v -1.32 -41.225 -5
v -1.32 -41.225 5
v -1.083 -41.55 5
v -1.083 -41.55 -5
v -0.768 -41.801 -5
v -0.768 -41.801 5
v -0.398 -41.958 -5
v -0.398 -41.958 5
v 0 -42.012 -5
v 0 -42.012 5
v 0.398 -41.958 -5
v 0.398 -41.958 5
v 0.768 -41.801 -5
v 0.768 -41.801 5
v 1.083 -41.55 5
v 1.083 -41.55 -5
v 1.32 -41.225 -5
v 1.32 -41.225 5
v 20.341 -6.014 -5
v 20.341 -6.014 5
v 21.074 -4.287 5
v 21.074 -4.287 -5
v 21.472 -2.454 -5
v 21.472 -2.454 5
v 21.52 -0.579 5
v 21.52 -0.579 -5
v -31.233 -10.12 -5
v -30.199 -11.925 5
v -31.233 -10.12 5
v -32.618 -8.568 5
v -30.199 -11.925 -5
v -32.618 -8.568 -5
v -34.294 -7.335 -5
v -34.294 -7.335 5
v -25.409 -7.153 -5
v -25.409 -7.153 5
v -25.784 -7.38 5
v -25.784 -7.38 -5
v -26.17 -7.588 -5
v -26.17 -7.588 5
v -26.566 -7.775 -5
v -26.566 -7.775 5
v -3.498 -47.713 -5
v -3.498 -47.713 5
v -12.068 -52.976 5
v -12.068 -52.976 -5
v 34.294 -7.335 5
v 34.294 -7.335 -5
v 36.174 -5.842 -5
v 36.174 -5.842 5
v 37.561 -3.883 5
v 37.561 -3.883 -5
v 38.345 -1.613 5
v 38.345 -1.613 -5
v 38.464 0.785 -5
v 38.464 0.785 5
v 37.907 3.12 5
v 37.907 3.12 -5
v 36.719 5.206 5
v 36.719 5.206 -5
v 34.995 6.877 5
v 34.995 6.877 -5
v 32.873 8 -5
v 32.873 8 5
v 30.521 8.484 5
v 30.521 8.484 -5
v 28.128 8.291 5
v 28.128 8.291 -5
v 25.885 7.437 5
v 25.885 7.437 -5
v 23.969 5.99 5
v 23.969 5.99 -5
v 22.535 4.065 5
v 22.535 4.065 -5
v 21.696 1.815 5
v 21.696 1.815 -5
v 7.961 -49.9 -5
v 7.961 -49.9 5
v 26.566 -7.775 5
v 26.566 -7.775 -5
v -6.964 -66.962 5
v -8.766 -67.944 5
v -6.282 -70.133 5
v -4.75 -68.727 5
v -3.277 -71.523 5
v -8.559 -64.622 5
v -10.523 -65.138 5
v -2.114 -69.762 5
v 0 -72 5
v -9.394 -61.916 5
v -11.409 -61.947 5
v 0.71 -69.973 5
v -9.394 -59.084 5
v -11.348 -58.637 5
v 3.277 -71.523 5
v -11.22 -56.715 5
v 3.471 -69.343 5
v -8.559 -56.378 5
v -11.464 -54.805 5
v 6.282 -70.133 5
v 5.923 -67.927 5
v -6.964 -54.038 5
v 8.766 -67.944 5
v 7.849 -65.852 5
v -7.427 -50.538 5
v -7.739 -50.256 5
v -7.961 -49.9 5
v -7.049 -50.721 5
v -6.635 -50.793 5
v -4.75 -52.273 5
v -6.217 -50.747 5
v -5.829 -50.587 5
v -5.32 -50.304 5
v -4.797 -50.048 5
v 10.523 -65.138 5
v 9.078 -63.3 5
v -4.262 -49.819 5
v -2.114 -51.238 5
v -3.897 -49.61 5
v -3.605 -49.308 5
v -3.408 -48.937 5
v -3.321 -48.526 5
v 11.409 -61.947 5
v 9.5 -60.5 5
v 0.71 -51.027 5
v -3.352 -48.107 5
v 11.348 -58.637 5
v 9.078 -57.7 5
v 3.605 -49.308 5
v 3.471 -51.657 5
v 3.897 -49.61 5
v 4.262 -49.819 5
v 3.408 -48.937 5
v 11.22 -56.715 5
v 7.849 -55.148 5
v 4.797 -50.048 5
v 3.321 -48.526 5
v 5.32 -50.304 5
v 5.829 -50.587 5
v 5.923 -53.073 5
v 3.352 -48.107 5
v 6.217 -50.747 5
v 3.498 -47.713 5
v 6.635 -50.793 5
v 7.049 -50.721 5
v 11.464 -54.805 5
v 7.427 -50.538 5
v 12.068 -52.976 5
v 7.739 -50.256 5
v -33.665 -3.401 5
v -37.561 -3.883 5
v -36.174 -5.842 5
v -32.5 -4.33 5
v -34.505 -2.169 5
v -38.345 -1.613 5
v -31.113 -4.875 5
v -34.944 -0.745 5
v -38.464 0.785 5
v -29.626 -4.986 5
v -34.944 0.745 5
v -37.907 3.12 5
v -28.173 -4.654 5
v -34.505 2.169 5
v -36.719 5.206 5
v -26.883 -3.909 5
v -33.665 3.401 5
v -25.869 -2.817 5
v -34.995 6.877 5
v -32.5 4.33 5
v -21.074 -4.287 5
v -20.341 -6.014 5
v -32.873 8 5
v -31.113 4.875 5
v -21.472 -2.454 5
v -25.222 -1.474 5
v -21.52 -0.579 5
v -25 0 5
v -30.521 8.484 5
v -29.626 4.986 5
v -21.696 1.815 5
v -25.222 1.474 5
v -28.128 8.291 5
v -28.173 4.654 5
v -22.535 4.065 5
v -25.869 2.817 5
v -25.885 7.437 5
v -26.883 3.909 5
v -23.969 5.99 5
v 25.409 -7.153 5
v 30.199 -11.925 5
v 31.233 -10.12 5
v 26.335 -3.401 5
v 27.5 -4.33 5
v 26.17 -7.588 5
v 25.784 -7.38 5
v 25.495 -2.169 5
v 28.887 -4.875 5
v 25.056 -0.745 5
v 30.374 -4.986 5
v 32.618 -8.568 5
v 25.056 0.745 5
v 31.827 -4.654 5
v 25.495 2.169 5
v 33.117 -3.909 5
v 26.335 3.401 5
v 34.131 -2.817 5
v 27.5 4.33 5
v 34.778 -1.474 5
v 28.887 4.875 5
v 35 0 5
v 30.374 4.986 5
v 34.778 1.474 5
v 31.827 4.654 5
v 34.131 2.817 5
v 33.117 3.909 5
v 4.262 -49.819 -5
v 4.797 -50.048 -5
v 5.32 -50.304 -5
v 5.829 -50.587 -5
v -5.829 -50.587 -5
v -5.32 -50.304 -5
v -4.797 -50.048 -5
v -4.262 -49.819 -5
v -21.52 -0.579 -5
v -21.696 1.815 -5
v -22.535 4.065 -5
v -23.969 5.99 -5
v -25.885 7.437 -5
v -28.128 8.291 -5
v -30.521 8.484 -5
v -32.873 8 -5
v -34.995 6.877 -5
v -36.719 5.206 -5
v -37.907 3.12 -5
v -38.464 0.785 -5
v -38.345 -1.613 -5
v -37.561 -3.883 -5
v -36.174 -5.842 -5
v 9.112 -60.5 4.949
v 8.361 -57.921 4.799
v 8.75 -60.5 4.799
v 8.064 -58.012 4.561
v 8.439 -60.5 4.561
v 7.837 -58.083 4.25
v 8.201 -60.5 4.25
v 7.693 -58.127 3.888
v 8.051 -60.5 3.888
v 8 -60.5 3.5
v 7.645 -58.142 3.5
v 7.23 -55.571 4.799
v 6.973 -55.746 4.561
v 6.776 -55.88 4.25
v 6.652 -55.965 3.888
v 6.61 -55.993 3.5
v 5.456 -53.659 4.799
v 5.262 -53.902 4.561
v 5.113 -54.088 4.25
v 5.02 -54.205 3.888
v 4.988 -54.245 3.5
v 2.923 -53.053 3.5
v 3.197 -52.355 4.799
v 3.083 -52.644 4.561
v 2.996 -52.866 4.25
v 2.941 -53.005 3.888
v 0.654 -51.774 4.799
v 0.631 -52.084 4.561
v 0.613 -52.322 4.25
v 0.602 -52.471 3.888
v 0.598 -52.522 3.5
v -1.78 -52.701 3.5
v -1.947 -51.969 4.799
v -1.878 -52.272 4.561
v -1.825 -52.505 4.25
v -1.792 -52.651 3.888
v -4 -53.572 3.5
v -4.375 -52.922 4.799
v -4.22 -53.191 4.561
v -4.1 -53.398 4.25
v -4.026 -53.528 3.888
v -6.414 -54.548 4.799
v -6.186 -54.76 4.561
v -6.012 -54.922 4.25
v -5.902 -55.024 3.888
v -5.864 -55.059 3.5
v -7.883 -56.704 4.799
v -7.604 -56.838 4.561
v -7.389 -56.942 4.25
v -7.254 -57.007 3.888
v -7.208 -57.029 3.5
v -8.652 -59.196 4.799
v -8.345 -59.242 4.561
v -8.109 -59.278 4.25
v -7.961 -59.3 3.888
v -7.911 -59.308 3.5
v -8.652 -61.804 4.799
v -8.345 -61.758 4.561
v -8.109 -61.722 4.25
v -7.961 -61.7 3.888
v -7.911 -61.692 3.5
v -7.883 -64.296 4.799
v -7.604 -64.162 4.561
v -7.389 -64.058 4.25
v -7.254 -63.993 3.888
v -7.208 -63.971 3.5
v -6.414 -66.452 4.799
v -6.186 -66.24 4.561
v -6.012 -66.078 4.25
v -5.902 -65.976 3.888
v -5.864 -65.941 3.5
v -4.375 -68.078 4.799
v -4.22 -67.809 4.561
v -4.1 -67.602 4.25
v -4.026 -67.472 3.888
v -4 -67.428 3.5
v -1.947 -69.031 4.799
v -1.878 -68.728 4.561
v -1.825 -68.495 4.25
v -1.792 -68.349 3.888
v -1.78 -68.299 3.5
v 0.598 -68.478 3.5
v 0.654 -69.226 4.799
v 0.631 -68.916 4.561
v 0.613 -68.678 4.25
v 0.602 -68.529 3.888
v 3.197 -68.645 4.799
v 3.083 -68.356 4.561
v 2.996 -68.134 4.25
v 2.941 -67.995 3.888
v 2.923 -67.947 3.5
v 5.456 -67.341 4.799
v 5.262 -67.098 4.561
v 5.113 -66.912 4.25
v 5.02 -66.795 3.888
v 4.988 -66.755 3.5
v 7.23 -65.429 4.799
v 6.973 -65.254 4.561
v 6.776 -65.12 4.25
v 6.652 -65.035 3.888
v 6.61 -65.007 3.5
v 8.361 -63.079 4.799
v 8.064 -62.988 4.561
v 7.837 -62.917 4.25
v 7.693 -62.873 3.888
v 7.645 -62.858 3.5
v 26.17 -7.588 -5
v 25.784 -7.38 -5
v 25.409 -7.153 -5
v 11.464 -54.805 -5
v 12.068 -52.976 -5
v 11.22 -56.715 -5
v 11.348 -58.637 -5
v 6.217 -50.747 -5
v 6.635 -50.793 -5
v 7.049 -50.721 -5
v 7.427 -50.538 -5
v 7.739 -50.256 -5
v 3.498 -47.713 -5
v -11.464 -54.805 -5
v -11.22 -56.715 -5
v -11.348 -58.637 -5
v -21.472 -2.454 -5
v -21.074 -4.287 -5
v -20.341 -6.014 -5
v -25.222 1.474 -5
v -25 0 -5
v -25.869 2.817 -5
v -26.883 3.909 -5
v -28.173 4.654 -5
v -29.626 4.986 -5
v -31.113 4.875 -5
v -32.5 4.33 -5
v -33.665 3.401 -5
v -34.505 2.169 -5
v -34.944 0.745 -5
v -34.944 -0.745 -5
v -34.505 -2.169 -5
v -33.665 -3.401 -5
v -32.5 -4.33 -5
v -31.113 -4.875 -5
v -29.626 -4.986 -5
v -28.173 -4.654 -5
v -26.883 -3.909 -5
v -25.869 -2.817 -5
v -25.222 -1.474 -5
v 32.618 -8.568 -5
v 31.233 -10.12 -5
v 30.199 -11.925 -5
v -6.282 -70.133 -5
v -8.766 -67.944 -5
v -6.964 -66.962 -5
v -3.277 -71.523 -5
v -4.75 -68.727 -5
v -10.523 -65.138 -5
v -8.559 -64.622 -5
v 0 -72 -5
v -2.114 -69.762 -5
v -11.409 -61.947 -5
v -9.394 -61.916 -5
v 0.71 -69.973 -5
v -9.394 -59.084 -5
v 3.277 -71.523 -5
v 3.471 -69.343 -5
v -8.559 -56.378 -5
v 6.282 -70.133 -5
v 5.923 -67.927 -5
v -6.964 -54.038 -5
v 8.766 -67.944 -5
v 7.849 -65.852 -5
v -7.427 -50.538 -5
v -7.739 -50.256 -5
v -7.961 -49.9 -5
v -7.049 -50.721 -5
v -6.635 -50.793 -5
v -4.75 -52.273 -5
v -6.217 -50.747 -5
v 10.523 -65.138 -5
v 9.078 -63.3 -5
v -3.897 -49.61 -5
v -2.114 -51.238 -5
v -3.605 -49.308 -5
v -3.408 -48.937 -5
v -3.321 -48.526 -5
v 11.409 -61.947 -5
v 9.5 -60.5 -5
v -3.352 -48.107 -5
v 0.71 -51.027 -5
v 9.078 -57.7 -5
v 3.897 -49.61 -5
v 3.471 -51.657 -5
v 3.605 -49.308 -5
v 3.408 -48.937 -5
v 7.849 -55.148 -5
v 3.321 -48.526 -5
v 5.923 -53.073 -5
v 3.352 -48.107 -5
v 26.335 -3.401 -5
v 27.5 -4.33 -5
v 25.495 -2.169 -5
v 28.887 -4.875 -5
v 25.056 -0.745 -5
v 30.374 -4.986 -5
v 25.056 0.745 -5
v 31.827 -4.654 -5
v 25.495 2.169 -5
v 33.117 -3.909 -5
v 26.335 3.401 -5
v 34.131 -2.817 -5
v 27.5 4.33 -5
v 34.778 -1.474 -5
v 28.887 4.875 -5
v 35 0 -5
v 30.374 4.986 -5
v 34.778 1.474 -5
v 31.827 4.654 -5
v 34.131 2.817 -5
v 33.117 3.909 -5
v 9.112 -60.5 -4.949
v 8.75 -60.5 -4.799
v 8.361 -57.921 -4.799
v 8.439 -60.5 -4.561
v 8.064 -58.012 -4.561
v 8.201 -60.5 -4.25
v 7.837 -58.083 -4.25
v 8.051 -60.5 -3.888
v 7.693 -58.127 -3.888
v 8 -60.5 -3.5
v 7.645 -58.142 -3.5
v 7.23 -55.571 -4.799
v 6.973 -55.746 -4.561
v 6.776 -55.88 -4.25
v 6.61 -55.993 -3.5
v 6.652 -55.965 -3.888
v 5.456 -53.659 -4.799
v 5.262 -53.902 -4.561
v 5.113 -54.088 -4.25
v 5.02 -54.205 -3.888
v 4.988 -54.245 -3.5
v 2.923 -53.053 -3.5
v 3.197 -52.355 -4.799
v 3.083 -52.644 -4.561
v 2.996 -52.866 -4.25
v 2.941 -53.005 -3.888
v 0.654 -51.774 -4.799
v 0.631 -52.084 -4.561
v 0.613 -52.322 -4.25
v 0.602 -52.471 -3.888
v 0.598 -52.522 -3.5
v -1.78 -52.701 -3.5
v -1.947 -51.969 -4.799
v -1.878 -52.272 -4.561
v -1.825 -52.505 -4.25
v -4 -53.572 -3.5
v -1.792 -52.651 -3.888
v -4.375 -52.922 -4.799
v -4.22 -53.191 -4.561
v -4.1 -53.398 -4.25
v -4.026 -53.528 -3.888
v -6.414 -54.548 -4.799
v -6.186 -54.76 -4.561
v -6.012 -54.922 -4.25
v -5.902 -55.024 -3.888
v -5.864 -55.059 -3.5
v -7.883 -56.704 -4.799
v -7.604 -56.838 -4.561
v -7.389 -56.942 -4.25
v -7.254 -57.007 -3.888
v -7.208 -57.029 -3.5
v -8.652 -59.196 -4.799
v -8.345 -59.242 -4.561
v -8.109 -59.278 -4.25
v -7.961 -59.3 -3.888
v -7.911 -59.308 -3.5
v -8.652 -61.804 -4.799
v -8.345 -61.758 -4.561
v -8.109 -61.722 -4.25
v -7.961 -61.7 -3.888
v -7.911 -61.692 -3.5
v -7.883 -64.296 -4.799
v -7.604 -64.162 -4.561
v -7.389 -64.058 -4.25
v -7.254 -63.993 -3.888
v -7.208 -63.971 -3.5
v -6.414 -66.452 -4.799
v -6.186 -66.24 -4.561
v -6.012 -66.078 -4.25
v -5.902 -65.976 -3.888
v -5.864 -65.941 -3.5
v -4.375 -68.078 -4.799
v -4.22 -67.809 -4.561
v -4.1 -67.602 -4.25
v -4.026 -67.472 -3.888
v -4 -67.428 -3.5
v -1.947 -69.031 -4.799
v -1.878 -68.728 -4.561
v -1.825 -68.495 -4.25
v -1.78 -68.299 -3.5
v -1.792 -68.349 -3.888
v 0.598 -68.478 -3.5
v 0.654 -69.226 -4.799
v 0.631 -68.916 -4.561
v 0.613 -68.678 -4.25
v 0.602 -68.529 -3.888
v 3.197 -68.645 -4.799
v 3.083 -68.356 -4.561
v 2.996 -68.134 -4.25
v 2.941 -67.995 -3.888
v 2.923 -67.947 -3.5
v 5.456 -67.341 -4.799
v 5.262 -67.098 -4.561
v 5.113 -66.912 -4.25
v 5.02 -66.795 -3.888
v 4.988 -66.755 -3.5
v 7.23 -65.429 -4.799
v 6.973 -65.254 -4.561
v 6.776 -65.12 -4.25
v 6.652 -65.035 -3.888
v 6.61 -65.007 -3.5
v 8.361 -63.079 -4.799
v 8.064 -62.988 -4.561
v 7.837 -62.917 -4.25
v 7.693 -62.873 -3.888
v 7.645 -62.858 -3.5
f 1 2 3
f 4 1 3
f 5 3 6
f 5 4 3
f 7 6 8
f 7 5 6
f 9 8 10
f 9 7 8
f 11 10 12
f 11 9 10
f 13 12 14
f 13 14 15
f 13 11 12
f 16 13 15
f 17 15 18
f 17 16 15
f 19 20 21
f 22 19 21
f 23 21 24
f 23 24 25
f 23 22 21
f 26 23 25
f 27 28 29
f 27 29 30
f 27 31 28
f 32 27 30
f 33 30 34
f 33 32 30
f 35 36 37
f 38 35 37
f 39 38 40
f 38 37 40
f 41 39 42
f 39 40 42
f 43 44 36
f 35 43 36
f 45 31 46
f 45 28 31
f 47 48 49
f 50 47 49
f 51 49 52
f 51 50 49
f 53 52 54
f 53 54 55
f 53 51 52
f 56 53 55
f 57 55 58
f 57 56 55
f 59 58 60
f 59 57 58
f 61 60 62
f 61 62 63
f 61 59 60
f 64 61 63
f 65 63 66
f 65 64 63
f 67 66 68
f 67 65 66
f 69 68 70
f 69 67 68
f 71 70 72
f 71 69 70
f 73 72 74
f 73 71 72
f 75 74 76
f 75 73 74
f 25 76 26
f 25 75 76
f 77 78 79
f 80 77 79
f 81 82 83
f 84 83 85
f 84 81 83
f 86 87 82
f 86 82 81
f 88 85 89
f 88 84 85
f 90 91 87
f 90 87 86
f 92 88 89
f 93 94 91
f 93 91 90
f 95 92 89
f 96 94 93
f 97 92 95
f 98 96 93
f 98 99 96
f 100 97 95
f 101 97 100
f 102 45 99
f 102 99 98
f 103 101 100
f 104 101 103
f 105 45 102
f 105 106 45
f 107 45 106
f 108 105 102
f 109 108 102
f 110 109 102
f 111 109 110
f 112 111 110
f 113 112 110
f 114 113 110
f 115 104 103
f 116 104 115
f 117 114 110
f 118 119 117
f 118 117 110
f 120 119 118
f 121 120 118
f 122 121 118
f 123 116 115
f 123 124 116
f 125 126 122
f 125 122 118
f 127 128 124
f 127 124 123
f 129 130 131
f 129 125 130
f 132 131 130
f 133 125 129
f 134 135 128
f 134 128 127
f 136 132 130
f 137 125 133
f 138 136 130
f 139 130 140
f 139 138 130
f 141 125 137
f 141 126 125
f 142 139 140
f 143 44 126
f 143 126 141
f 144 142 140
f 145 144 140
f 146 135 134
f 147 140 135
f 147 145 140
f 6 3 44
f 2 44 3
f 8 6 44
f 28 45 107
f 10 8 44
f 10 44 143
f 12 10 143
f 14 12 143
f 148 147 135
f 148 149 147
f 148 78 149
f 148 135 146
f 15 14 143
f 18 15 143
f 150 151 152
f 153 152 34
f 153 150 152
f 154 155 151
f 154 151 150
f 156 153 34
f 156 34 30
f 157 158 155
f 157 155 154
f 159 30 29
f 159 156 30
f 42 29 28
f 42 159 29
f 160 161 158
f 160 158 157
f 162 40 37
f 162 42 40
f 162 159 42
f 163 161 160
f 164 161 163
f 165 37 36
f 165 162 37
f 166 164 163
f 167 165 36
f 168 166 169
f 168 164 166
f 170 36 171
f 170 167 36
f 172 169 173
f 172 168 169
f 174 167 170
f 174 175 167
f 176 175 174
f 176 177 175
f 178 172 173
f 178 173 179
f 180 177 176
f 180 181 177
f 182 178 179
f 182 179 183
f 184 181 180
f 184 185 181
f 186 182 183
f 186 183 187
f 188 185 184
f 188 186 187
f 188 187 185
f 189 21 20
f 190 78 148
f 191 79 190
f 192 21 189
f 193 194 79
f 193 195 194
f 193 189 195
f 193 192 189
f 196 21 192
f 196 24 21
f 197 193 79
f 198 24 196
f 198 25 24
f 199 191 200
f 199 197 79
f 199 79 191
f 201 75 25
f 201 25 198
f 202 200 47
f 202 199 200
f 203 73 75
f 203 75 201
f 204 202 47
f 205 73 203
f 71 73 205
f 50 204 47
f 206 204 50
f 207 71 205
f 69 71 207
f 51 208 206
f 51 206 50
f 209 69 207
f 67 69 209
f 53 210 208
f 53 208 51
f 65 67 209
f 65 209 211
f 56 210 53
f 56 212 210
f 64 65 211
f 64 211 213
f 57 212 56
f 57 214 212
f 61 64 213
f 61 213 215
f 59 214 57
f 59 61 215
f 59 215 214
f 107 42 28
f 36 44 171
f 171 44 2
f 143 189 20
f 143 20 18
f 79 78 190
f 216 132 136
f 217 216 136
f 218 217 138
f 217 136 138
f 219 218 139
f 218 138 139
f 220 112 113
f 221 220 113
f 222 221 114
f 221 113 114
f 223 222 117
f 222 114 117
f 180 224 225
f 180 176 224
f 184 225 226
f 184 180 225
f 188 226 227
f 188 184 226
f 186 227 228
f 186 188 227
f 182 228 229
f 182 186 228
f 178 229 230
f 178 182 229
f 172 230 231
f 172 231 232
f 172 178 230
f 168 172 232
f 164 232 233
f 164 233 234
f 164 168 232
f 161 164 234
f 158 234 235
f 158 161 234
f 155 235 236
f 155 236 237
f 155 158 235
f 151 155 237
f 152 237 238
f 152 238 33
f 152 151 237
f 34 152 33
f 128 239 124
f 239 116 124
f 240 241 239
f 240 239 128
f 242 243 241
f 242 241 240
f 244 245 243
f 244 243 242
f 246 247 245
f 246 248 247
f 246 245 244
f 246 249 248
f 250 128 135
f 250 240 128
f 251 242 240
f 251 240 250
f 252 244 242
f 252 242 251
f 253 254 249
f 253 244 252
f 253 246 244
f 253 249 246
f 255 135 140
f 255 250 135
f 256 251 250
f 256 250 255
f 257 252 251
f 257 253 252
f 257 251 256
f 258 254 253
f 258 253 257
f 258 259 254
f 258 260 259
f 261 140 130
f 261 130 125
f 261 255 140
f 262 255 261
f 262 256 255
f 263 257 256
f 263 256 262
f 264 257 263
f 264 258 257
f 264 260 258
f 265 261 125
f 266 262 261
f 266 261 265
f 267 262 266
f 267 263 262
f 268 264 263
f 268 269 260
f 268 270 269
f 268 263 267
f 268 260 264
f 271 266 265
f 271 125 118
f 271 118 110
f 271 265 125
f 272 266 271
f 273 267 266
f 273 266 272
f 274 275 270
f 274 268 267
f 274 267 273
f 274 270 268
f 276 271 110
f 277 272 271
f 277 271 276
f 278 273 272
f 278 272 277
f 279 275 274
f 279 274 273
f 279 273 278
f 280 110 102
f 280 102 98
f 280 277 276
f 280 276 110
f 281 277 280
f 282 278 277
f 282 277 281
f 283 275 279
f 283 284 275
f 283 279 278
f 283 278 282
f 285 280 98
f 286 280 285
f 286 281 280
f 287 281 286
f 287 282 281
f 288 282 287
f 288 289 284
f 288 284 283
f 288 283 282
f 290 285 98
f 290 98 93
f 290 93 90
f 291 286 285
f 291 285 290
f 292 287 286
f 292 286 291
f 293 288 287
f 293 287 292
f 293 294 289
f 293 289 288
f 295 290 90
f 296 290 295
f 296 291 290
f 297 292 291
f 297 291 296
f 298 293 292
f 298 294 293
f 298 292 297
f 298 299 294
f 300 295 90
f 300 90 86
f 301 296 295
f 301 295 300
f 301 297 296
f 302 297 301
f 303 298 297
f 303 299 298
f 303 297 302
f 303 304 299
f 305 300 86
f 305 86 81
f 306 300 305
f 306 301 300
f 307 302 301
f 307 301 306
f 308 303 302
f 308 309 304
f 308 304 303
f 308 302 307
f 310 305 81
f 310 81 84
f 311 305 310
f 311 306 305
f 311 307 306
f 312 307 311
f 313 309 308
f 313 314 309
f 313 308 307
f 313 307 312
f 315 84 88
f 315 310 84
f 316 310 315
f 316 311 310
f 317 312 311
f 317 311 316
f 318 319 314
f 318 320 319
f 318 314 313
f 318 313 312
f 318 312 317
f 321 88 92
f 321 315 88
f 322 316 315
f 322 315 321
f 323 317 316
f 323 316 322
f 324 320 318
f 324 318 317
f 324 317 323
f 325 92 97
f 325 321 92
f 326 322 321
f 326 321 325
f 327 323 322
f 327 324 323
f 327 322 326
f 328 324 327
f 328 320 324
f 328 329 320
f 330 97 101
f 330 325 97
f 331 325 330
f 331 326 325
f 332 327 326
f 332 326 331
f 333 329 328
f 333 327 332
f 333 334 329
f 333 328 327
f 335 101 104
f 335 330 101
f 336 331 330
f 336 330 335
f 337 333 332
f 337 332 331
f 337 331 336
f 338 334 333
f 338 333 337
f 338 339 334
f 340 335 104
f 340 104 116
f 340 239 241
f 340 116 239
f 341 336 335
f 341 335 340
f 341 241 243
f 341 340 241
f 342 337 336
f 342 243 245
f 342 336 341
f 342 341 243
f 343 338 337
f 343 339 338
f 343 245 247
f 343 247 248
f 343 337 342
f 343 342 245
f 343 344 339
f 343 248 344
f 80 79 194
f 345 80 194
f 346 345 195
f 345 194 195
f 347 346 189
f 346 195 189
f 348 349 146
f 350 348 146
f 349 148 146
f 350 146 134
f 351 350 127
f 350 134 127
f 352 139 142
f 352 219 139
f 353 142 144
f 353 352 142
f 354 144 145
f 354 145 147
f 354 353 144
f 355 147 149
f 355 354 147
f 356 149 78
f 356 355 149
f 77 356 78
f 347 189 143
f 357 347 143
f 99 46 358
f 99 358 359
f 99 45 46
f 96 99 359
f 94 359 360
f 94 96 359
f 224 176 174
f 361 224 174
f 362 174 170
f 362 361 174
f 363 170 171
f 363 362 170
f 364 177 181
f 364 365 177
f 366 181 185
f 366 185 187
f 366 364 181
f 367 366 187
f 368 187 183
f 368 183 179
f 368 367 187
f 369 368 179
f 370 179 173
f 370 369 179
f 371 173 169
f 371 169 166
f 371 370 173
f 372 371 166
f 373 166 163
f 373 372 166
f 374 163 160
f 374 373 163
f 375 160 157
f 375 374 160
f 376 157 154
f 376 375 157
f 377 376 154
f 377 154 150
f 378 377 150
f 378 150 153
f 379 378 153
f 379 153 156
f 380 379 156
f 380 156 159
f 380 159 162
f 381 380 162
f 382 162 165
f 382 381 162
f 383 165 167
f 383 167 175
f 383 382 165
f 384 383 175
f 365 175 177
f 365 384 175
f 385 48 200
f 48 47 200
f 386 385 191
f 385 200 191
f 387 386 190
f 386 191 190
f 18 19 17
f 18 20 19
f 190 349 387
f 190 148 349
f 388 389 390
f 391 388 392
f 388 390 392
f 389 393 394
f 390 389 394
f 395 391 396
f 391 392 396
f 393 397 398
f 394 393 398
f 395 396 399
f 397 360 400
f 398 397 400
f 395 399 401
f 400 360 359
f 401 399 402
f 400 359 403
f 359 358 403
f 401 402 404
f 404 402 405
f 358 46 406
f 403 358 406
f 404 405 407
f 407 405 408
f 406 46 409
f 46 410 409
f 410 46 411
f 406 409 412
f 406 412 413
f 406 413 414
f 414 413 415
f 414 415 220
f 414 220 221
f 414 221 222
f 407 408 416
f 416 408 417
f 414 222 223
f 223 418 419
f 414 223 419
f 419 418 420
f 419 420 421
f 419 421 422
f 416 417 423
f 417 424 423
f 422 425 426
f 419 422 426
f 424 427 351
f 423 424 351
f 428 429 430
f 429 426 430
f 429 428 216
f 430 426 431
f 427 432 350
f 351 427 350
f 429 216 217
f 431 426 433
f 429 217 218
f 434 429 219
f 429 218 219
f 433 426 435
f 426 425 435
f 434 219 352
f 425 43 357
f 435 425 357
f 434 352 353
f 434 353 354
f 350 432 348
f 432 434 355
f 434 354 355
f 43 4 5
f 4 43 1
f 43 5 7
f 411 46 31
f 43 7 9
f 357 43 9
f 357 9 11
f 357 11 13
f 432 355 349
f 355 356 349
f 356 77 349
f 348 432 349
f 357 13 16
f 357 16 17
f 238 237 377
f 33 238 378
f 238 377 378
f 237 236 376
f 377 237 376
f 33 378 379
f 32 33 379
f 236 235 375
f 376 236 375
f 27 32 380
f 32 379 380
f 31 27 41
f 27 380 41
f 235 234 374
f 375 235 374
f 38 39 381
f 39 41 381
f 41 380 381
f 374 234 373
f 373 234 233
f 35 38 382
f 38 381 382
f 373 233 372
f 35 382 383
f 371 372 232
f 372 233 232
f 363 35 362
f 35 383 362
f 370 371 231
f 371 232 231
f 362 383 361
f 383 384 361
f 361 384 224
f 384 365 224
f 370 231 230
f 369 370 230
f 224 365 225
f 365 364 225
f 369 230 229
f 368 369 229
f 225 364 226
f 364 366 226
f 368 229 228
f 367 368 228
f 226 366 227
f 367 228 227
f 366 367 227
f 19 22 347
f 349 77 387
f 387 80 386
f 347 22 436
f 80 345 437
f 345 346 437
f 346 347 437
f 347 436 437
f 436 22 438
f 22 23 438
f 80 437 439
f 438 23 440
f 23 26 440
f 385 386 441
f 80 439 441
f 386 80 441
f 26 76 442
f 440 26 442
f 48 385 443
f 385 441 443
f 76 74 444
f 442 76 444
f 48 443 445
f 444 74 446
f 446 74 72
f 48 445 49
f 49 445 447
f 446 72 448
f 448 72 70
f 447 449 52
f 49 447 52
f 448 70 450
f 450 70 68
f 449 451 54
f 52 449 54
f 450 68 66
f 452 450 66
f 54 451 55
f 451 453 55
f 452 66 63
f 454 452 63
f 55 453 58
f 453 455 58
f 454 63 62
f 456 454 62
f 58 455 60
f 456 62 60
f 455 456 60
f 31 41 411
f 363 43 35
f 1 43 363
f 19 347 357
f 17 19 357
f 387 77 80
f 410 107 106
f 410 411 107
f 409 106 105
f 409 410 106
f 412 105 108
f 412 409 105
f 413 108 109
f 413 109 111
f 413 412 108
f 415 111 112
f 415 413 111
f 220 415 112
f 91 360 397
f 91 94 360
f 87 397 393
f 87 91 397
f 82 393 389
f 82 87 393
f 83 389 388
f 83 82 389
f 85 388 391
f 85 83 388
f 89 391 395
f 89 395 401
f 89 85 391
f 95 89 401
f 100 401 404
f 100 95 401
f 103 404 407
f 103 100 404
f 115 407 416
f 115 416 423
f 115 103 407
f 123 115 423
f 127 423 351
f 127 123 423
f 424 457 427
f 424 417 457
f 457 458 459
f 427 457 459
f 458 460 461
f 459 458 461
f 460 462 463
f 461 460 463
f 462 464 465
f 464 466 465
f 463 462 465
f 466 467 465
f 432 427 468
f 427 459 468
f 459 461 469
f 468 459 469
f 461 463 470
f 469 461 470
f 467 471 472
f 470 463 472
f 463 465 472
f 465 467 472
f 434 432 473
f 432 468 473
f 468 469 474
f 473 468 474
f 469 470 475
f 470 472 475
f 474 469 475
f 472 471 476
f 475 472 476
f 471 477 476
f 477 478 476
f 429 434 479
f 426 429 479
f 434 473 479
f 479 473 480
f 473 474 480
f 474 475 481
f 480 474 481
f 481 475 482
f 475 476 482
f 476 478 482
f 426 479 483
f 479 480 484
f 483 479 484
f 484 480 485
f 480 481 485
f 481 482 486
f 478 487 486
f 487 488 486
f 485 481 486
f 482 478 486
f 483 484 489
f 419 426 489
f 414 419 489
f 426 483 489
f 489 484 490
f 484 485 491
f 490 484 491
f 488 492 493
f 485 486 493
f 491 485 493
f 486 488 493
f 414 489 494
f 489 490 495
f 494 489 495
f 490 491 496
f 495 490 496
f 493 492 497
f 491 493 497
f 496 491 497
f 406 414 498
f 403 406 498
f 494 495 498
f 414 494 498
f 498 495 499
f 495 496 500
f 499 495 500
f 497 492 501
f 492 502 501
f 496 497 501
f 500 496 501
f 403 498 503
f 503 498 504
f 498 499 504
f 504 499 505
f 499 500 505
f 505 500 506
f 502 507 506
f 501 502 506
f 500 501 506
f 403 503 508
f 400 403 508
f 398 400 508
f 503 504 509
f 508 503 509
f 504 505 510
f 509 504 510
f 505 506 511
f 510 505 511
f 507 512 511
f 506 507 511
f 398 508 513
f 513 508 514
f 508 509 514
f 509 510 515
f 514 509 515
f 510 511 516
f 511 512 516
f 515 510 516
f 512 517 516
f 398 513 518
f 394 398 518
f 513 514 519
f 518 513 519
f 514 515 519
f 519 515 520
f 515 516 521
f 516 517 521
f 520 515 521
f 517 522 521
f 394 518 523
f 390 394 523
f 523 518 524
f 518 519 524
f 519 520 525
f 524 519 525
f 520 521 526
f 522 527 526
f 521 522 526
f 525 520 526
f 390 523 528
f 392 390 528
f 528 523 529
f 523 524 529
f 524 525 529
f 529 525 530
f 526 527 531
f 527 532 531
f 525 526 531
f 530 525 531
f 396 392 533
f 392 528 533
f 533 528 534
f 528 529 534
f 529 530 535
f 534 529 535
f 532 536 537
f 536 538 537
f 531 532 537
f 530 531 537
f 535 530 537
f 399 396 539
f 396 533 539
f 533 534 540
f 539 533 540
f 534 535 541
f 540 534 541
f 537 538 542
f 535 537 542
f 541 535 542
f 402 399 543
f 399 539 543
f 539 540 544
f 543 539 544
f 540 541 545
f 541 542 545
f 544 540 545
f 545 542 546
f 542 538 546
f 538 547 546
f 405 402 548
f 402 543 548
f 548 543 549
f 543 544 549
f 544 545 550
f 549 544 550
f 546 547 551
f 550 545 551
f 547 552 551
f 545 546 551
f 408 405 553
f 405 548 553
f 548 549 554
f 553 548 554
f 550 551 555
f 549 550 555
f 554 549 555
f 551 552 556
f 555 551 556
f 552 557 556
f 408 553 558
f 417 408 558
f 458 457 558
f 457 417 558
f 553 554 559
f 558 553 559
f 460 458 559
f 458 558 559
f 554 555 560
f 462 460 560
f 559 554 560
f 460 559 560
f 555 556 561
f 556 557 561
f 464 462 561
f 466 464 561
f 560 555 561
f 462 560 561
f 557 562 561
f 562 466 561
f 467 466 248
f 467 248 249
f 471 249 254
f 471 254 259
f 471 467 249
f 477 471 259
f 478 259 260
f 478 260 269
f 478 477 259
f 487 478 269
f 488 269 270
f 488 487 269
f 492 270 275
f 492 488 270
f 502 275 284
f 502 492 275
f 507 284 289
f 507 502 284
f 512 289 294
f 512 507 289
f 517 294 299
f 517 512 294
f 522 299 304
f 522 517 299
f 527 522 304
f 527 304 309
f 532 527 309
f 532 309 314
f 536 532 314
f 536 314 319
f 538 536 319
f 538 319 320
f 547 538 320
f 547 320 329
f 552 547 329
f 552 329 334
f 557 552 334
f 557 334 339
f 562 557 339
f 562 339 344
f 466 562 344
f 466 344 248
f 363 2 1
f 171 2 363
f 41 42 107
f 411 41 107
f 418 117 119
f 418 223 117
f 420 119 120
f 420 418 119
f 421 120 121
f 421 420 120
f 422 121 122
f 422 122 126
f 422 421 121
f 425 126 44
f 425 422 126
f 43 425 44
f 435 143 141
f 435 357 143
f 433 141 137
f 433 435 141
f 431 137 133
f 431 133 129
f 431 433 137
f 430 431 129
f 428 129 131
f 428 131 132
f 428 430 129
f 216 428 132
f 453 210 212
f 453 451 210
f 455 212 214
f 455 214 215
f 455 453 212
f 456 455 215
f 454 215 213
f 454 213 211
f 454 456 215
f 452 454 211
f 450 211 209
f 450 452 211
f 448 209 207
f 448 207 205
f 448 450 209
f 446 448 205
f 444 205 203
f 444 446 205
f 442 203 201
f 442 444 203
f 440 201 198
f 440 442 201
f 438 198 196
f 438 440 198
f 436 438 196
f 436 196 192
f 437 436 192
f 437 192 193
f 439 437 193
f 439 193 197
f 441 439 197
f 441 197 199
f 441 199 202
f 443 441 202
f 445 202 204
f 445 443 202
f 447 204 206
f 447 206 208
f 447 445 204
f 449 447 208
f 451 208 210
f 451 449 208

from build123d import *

# Parameters (mm, degrees)
SCHIZZO1_R                   = 5
SCHIZZO1_R_2                 = 8
ESTRUSIONE_ESTRUSIONE1_DEPTH = 5
RACCORDO1_R                  = 10
TAGLIO_ESTRUSIONE1_DEPTH     = 10
RACCORDO2_R                  = 1.5


with BuildPart() as part:
    # Schizzo1 → Estrusione-Estrusione1 (new body, symmetric)
    with BuildSketch(Plane.XY):
        with BuildLine():
            Line((-31.796659285, -8.307948929), (-10.655708964, -56.174972085))
            ThreePointArc((-10.655708964, -56.174972085), (0, -72), (10.655708964, -56.174972085))
            Line((10.655708964, -56.174972085), (31.796659285, -8.307948929))
            ThreePointArc((31.796659285, -8.307948929), (34.104135411, 7.443525544), (22.015418218, -2.914867709))
            Line((22.015418218, -2.914867709), (0, -43.668257767))
            Line((0, -43.668257767), (-22.015418218, -2.914867709))
            ThreePointArc((-22.015418218, -2.914867709), (-34.104135411, 7.443525544), (-31.796659285, -8.307948929))
        make_face()
        with Locations((-30, 0)):
            Circle(SCHIZZO1_R, mode=Mode.SUBTRACT)
        with Locations((30, 0)):
            Circle(SCHIZZO1_R, mode=Mode.SUBTRACT)
        with Locations((0, -60.5)):
            Circle(SCHIZZO1_R_2, mode=Mode.SUBTRACT)
    extrude(amount=ESTRUSIONE_ESTRUSIONE1_DEPTH, both=True)

    # Raccordo1
    raccordo1_edges = [part.edges().sort_by_distance(p)[0] for p in [
        (22.015418218, -2.914867709, 0),
        (31.796659285, -8.307948929, 0),
        (10.655708964, -56.174972085, 0),
        (-10.655708964, -56.174972085, 0),
        (-31.796659285, -8.307948929, 0),
        (-22.015418218, -2.914867709, 0),
    ]]
    fillet(raccordo1_edges, radius=RACCORDO1_R)

    # Schizzo2 → Taglio-Estrusione1 (cut)
    with BuildSketch(Plane.XY.offset(5)):
        with BuildLine():
            Line((-26.565911307, -7.775412198), (-7.229506839, -51.556609655))
            ThreePointArc((-7.229506839, -51.556609655), (-5.059978512, -50.173015084), (-2.637118885, -49.306448107))
            Line((-2.637118885, -49.306448107), (-25.408693659, -7.153314343))
            ThreePointArc((-25.408693659, -7.153314343), (-25.975264878, -7.486755452), (-26.565911307, -7.775412198))
        make_face()
        with BuildLine():
            Line((25.408693659, -7.153314343), (2.637118885, -49.306448107))
            ThreePointArc((2.637118885, -49.306448107), (5.059978512, -50.173015084), (7.229506839, -51.556609655))
            Line((7.229506839, -51.556609655), (26.565911307, -7.775412198))
            ThreePointArc((26.565911307, -7.775412198), (25.975264878, -7.486755452), (25.408693659, -7.153314343))
        make_face()
    extrude(amount=-TAGLIO_ESTRUSIONE1_DEPTH, mode=Mode.SUBTRACT)

    # Raccordo2
    raccordo2_edges = [part.edges().sort_by_distance(p)[0] for p in [
        (-8, -60.5, -5),
        (0, -43.668257767, 0),
        (-8, -60.5, 5),
        (7.229506839, -51.556609655, 0),
        (2.637118885, -49.306448107, 0),
        (-2.637118885, -49.306448107, 0),
        (-7.229506839, -51.556609655, 0),
    ]]
    fillet(raccordo2_edges, radius=RACCORDO2_R)


solid = part.part
